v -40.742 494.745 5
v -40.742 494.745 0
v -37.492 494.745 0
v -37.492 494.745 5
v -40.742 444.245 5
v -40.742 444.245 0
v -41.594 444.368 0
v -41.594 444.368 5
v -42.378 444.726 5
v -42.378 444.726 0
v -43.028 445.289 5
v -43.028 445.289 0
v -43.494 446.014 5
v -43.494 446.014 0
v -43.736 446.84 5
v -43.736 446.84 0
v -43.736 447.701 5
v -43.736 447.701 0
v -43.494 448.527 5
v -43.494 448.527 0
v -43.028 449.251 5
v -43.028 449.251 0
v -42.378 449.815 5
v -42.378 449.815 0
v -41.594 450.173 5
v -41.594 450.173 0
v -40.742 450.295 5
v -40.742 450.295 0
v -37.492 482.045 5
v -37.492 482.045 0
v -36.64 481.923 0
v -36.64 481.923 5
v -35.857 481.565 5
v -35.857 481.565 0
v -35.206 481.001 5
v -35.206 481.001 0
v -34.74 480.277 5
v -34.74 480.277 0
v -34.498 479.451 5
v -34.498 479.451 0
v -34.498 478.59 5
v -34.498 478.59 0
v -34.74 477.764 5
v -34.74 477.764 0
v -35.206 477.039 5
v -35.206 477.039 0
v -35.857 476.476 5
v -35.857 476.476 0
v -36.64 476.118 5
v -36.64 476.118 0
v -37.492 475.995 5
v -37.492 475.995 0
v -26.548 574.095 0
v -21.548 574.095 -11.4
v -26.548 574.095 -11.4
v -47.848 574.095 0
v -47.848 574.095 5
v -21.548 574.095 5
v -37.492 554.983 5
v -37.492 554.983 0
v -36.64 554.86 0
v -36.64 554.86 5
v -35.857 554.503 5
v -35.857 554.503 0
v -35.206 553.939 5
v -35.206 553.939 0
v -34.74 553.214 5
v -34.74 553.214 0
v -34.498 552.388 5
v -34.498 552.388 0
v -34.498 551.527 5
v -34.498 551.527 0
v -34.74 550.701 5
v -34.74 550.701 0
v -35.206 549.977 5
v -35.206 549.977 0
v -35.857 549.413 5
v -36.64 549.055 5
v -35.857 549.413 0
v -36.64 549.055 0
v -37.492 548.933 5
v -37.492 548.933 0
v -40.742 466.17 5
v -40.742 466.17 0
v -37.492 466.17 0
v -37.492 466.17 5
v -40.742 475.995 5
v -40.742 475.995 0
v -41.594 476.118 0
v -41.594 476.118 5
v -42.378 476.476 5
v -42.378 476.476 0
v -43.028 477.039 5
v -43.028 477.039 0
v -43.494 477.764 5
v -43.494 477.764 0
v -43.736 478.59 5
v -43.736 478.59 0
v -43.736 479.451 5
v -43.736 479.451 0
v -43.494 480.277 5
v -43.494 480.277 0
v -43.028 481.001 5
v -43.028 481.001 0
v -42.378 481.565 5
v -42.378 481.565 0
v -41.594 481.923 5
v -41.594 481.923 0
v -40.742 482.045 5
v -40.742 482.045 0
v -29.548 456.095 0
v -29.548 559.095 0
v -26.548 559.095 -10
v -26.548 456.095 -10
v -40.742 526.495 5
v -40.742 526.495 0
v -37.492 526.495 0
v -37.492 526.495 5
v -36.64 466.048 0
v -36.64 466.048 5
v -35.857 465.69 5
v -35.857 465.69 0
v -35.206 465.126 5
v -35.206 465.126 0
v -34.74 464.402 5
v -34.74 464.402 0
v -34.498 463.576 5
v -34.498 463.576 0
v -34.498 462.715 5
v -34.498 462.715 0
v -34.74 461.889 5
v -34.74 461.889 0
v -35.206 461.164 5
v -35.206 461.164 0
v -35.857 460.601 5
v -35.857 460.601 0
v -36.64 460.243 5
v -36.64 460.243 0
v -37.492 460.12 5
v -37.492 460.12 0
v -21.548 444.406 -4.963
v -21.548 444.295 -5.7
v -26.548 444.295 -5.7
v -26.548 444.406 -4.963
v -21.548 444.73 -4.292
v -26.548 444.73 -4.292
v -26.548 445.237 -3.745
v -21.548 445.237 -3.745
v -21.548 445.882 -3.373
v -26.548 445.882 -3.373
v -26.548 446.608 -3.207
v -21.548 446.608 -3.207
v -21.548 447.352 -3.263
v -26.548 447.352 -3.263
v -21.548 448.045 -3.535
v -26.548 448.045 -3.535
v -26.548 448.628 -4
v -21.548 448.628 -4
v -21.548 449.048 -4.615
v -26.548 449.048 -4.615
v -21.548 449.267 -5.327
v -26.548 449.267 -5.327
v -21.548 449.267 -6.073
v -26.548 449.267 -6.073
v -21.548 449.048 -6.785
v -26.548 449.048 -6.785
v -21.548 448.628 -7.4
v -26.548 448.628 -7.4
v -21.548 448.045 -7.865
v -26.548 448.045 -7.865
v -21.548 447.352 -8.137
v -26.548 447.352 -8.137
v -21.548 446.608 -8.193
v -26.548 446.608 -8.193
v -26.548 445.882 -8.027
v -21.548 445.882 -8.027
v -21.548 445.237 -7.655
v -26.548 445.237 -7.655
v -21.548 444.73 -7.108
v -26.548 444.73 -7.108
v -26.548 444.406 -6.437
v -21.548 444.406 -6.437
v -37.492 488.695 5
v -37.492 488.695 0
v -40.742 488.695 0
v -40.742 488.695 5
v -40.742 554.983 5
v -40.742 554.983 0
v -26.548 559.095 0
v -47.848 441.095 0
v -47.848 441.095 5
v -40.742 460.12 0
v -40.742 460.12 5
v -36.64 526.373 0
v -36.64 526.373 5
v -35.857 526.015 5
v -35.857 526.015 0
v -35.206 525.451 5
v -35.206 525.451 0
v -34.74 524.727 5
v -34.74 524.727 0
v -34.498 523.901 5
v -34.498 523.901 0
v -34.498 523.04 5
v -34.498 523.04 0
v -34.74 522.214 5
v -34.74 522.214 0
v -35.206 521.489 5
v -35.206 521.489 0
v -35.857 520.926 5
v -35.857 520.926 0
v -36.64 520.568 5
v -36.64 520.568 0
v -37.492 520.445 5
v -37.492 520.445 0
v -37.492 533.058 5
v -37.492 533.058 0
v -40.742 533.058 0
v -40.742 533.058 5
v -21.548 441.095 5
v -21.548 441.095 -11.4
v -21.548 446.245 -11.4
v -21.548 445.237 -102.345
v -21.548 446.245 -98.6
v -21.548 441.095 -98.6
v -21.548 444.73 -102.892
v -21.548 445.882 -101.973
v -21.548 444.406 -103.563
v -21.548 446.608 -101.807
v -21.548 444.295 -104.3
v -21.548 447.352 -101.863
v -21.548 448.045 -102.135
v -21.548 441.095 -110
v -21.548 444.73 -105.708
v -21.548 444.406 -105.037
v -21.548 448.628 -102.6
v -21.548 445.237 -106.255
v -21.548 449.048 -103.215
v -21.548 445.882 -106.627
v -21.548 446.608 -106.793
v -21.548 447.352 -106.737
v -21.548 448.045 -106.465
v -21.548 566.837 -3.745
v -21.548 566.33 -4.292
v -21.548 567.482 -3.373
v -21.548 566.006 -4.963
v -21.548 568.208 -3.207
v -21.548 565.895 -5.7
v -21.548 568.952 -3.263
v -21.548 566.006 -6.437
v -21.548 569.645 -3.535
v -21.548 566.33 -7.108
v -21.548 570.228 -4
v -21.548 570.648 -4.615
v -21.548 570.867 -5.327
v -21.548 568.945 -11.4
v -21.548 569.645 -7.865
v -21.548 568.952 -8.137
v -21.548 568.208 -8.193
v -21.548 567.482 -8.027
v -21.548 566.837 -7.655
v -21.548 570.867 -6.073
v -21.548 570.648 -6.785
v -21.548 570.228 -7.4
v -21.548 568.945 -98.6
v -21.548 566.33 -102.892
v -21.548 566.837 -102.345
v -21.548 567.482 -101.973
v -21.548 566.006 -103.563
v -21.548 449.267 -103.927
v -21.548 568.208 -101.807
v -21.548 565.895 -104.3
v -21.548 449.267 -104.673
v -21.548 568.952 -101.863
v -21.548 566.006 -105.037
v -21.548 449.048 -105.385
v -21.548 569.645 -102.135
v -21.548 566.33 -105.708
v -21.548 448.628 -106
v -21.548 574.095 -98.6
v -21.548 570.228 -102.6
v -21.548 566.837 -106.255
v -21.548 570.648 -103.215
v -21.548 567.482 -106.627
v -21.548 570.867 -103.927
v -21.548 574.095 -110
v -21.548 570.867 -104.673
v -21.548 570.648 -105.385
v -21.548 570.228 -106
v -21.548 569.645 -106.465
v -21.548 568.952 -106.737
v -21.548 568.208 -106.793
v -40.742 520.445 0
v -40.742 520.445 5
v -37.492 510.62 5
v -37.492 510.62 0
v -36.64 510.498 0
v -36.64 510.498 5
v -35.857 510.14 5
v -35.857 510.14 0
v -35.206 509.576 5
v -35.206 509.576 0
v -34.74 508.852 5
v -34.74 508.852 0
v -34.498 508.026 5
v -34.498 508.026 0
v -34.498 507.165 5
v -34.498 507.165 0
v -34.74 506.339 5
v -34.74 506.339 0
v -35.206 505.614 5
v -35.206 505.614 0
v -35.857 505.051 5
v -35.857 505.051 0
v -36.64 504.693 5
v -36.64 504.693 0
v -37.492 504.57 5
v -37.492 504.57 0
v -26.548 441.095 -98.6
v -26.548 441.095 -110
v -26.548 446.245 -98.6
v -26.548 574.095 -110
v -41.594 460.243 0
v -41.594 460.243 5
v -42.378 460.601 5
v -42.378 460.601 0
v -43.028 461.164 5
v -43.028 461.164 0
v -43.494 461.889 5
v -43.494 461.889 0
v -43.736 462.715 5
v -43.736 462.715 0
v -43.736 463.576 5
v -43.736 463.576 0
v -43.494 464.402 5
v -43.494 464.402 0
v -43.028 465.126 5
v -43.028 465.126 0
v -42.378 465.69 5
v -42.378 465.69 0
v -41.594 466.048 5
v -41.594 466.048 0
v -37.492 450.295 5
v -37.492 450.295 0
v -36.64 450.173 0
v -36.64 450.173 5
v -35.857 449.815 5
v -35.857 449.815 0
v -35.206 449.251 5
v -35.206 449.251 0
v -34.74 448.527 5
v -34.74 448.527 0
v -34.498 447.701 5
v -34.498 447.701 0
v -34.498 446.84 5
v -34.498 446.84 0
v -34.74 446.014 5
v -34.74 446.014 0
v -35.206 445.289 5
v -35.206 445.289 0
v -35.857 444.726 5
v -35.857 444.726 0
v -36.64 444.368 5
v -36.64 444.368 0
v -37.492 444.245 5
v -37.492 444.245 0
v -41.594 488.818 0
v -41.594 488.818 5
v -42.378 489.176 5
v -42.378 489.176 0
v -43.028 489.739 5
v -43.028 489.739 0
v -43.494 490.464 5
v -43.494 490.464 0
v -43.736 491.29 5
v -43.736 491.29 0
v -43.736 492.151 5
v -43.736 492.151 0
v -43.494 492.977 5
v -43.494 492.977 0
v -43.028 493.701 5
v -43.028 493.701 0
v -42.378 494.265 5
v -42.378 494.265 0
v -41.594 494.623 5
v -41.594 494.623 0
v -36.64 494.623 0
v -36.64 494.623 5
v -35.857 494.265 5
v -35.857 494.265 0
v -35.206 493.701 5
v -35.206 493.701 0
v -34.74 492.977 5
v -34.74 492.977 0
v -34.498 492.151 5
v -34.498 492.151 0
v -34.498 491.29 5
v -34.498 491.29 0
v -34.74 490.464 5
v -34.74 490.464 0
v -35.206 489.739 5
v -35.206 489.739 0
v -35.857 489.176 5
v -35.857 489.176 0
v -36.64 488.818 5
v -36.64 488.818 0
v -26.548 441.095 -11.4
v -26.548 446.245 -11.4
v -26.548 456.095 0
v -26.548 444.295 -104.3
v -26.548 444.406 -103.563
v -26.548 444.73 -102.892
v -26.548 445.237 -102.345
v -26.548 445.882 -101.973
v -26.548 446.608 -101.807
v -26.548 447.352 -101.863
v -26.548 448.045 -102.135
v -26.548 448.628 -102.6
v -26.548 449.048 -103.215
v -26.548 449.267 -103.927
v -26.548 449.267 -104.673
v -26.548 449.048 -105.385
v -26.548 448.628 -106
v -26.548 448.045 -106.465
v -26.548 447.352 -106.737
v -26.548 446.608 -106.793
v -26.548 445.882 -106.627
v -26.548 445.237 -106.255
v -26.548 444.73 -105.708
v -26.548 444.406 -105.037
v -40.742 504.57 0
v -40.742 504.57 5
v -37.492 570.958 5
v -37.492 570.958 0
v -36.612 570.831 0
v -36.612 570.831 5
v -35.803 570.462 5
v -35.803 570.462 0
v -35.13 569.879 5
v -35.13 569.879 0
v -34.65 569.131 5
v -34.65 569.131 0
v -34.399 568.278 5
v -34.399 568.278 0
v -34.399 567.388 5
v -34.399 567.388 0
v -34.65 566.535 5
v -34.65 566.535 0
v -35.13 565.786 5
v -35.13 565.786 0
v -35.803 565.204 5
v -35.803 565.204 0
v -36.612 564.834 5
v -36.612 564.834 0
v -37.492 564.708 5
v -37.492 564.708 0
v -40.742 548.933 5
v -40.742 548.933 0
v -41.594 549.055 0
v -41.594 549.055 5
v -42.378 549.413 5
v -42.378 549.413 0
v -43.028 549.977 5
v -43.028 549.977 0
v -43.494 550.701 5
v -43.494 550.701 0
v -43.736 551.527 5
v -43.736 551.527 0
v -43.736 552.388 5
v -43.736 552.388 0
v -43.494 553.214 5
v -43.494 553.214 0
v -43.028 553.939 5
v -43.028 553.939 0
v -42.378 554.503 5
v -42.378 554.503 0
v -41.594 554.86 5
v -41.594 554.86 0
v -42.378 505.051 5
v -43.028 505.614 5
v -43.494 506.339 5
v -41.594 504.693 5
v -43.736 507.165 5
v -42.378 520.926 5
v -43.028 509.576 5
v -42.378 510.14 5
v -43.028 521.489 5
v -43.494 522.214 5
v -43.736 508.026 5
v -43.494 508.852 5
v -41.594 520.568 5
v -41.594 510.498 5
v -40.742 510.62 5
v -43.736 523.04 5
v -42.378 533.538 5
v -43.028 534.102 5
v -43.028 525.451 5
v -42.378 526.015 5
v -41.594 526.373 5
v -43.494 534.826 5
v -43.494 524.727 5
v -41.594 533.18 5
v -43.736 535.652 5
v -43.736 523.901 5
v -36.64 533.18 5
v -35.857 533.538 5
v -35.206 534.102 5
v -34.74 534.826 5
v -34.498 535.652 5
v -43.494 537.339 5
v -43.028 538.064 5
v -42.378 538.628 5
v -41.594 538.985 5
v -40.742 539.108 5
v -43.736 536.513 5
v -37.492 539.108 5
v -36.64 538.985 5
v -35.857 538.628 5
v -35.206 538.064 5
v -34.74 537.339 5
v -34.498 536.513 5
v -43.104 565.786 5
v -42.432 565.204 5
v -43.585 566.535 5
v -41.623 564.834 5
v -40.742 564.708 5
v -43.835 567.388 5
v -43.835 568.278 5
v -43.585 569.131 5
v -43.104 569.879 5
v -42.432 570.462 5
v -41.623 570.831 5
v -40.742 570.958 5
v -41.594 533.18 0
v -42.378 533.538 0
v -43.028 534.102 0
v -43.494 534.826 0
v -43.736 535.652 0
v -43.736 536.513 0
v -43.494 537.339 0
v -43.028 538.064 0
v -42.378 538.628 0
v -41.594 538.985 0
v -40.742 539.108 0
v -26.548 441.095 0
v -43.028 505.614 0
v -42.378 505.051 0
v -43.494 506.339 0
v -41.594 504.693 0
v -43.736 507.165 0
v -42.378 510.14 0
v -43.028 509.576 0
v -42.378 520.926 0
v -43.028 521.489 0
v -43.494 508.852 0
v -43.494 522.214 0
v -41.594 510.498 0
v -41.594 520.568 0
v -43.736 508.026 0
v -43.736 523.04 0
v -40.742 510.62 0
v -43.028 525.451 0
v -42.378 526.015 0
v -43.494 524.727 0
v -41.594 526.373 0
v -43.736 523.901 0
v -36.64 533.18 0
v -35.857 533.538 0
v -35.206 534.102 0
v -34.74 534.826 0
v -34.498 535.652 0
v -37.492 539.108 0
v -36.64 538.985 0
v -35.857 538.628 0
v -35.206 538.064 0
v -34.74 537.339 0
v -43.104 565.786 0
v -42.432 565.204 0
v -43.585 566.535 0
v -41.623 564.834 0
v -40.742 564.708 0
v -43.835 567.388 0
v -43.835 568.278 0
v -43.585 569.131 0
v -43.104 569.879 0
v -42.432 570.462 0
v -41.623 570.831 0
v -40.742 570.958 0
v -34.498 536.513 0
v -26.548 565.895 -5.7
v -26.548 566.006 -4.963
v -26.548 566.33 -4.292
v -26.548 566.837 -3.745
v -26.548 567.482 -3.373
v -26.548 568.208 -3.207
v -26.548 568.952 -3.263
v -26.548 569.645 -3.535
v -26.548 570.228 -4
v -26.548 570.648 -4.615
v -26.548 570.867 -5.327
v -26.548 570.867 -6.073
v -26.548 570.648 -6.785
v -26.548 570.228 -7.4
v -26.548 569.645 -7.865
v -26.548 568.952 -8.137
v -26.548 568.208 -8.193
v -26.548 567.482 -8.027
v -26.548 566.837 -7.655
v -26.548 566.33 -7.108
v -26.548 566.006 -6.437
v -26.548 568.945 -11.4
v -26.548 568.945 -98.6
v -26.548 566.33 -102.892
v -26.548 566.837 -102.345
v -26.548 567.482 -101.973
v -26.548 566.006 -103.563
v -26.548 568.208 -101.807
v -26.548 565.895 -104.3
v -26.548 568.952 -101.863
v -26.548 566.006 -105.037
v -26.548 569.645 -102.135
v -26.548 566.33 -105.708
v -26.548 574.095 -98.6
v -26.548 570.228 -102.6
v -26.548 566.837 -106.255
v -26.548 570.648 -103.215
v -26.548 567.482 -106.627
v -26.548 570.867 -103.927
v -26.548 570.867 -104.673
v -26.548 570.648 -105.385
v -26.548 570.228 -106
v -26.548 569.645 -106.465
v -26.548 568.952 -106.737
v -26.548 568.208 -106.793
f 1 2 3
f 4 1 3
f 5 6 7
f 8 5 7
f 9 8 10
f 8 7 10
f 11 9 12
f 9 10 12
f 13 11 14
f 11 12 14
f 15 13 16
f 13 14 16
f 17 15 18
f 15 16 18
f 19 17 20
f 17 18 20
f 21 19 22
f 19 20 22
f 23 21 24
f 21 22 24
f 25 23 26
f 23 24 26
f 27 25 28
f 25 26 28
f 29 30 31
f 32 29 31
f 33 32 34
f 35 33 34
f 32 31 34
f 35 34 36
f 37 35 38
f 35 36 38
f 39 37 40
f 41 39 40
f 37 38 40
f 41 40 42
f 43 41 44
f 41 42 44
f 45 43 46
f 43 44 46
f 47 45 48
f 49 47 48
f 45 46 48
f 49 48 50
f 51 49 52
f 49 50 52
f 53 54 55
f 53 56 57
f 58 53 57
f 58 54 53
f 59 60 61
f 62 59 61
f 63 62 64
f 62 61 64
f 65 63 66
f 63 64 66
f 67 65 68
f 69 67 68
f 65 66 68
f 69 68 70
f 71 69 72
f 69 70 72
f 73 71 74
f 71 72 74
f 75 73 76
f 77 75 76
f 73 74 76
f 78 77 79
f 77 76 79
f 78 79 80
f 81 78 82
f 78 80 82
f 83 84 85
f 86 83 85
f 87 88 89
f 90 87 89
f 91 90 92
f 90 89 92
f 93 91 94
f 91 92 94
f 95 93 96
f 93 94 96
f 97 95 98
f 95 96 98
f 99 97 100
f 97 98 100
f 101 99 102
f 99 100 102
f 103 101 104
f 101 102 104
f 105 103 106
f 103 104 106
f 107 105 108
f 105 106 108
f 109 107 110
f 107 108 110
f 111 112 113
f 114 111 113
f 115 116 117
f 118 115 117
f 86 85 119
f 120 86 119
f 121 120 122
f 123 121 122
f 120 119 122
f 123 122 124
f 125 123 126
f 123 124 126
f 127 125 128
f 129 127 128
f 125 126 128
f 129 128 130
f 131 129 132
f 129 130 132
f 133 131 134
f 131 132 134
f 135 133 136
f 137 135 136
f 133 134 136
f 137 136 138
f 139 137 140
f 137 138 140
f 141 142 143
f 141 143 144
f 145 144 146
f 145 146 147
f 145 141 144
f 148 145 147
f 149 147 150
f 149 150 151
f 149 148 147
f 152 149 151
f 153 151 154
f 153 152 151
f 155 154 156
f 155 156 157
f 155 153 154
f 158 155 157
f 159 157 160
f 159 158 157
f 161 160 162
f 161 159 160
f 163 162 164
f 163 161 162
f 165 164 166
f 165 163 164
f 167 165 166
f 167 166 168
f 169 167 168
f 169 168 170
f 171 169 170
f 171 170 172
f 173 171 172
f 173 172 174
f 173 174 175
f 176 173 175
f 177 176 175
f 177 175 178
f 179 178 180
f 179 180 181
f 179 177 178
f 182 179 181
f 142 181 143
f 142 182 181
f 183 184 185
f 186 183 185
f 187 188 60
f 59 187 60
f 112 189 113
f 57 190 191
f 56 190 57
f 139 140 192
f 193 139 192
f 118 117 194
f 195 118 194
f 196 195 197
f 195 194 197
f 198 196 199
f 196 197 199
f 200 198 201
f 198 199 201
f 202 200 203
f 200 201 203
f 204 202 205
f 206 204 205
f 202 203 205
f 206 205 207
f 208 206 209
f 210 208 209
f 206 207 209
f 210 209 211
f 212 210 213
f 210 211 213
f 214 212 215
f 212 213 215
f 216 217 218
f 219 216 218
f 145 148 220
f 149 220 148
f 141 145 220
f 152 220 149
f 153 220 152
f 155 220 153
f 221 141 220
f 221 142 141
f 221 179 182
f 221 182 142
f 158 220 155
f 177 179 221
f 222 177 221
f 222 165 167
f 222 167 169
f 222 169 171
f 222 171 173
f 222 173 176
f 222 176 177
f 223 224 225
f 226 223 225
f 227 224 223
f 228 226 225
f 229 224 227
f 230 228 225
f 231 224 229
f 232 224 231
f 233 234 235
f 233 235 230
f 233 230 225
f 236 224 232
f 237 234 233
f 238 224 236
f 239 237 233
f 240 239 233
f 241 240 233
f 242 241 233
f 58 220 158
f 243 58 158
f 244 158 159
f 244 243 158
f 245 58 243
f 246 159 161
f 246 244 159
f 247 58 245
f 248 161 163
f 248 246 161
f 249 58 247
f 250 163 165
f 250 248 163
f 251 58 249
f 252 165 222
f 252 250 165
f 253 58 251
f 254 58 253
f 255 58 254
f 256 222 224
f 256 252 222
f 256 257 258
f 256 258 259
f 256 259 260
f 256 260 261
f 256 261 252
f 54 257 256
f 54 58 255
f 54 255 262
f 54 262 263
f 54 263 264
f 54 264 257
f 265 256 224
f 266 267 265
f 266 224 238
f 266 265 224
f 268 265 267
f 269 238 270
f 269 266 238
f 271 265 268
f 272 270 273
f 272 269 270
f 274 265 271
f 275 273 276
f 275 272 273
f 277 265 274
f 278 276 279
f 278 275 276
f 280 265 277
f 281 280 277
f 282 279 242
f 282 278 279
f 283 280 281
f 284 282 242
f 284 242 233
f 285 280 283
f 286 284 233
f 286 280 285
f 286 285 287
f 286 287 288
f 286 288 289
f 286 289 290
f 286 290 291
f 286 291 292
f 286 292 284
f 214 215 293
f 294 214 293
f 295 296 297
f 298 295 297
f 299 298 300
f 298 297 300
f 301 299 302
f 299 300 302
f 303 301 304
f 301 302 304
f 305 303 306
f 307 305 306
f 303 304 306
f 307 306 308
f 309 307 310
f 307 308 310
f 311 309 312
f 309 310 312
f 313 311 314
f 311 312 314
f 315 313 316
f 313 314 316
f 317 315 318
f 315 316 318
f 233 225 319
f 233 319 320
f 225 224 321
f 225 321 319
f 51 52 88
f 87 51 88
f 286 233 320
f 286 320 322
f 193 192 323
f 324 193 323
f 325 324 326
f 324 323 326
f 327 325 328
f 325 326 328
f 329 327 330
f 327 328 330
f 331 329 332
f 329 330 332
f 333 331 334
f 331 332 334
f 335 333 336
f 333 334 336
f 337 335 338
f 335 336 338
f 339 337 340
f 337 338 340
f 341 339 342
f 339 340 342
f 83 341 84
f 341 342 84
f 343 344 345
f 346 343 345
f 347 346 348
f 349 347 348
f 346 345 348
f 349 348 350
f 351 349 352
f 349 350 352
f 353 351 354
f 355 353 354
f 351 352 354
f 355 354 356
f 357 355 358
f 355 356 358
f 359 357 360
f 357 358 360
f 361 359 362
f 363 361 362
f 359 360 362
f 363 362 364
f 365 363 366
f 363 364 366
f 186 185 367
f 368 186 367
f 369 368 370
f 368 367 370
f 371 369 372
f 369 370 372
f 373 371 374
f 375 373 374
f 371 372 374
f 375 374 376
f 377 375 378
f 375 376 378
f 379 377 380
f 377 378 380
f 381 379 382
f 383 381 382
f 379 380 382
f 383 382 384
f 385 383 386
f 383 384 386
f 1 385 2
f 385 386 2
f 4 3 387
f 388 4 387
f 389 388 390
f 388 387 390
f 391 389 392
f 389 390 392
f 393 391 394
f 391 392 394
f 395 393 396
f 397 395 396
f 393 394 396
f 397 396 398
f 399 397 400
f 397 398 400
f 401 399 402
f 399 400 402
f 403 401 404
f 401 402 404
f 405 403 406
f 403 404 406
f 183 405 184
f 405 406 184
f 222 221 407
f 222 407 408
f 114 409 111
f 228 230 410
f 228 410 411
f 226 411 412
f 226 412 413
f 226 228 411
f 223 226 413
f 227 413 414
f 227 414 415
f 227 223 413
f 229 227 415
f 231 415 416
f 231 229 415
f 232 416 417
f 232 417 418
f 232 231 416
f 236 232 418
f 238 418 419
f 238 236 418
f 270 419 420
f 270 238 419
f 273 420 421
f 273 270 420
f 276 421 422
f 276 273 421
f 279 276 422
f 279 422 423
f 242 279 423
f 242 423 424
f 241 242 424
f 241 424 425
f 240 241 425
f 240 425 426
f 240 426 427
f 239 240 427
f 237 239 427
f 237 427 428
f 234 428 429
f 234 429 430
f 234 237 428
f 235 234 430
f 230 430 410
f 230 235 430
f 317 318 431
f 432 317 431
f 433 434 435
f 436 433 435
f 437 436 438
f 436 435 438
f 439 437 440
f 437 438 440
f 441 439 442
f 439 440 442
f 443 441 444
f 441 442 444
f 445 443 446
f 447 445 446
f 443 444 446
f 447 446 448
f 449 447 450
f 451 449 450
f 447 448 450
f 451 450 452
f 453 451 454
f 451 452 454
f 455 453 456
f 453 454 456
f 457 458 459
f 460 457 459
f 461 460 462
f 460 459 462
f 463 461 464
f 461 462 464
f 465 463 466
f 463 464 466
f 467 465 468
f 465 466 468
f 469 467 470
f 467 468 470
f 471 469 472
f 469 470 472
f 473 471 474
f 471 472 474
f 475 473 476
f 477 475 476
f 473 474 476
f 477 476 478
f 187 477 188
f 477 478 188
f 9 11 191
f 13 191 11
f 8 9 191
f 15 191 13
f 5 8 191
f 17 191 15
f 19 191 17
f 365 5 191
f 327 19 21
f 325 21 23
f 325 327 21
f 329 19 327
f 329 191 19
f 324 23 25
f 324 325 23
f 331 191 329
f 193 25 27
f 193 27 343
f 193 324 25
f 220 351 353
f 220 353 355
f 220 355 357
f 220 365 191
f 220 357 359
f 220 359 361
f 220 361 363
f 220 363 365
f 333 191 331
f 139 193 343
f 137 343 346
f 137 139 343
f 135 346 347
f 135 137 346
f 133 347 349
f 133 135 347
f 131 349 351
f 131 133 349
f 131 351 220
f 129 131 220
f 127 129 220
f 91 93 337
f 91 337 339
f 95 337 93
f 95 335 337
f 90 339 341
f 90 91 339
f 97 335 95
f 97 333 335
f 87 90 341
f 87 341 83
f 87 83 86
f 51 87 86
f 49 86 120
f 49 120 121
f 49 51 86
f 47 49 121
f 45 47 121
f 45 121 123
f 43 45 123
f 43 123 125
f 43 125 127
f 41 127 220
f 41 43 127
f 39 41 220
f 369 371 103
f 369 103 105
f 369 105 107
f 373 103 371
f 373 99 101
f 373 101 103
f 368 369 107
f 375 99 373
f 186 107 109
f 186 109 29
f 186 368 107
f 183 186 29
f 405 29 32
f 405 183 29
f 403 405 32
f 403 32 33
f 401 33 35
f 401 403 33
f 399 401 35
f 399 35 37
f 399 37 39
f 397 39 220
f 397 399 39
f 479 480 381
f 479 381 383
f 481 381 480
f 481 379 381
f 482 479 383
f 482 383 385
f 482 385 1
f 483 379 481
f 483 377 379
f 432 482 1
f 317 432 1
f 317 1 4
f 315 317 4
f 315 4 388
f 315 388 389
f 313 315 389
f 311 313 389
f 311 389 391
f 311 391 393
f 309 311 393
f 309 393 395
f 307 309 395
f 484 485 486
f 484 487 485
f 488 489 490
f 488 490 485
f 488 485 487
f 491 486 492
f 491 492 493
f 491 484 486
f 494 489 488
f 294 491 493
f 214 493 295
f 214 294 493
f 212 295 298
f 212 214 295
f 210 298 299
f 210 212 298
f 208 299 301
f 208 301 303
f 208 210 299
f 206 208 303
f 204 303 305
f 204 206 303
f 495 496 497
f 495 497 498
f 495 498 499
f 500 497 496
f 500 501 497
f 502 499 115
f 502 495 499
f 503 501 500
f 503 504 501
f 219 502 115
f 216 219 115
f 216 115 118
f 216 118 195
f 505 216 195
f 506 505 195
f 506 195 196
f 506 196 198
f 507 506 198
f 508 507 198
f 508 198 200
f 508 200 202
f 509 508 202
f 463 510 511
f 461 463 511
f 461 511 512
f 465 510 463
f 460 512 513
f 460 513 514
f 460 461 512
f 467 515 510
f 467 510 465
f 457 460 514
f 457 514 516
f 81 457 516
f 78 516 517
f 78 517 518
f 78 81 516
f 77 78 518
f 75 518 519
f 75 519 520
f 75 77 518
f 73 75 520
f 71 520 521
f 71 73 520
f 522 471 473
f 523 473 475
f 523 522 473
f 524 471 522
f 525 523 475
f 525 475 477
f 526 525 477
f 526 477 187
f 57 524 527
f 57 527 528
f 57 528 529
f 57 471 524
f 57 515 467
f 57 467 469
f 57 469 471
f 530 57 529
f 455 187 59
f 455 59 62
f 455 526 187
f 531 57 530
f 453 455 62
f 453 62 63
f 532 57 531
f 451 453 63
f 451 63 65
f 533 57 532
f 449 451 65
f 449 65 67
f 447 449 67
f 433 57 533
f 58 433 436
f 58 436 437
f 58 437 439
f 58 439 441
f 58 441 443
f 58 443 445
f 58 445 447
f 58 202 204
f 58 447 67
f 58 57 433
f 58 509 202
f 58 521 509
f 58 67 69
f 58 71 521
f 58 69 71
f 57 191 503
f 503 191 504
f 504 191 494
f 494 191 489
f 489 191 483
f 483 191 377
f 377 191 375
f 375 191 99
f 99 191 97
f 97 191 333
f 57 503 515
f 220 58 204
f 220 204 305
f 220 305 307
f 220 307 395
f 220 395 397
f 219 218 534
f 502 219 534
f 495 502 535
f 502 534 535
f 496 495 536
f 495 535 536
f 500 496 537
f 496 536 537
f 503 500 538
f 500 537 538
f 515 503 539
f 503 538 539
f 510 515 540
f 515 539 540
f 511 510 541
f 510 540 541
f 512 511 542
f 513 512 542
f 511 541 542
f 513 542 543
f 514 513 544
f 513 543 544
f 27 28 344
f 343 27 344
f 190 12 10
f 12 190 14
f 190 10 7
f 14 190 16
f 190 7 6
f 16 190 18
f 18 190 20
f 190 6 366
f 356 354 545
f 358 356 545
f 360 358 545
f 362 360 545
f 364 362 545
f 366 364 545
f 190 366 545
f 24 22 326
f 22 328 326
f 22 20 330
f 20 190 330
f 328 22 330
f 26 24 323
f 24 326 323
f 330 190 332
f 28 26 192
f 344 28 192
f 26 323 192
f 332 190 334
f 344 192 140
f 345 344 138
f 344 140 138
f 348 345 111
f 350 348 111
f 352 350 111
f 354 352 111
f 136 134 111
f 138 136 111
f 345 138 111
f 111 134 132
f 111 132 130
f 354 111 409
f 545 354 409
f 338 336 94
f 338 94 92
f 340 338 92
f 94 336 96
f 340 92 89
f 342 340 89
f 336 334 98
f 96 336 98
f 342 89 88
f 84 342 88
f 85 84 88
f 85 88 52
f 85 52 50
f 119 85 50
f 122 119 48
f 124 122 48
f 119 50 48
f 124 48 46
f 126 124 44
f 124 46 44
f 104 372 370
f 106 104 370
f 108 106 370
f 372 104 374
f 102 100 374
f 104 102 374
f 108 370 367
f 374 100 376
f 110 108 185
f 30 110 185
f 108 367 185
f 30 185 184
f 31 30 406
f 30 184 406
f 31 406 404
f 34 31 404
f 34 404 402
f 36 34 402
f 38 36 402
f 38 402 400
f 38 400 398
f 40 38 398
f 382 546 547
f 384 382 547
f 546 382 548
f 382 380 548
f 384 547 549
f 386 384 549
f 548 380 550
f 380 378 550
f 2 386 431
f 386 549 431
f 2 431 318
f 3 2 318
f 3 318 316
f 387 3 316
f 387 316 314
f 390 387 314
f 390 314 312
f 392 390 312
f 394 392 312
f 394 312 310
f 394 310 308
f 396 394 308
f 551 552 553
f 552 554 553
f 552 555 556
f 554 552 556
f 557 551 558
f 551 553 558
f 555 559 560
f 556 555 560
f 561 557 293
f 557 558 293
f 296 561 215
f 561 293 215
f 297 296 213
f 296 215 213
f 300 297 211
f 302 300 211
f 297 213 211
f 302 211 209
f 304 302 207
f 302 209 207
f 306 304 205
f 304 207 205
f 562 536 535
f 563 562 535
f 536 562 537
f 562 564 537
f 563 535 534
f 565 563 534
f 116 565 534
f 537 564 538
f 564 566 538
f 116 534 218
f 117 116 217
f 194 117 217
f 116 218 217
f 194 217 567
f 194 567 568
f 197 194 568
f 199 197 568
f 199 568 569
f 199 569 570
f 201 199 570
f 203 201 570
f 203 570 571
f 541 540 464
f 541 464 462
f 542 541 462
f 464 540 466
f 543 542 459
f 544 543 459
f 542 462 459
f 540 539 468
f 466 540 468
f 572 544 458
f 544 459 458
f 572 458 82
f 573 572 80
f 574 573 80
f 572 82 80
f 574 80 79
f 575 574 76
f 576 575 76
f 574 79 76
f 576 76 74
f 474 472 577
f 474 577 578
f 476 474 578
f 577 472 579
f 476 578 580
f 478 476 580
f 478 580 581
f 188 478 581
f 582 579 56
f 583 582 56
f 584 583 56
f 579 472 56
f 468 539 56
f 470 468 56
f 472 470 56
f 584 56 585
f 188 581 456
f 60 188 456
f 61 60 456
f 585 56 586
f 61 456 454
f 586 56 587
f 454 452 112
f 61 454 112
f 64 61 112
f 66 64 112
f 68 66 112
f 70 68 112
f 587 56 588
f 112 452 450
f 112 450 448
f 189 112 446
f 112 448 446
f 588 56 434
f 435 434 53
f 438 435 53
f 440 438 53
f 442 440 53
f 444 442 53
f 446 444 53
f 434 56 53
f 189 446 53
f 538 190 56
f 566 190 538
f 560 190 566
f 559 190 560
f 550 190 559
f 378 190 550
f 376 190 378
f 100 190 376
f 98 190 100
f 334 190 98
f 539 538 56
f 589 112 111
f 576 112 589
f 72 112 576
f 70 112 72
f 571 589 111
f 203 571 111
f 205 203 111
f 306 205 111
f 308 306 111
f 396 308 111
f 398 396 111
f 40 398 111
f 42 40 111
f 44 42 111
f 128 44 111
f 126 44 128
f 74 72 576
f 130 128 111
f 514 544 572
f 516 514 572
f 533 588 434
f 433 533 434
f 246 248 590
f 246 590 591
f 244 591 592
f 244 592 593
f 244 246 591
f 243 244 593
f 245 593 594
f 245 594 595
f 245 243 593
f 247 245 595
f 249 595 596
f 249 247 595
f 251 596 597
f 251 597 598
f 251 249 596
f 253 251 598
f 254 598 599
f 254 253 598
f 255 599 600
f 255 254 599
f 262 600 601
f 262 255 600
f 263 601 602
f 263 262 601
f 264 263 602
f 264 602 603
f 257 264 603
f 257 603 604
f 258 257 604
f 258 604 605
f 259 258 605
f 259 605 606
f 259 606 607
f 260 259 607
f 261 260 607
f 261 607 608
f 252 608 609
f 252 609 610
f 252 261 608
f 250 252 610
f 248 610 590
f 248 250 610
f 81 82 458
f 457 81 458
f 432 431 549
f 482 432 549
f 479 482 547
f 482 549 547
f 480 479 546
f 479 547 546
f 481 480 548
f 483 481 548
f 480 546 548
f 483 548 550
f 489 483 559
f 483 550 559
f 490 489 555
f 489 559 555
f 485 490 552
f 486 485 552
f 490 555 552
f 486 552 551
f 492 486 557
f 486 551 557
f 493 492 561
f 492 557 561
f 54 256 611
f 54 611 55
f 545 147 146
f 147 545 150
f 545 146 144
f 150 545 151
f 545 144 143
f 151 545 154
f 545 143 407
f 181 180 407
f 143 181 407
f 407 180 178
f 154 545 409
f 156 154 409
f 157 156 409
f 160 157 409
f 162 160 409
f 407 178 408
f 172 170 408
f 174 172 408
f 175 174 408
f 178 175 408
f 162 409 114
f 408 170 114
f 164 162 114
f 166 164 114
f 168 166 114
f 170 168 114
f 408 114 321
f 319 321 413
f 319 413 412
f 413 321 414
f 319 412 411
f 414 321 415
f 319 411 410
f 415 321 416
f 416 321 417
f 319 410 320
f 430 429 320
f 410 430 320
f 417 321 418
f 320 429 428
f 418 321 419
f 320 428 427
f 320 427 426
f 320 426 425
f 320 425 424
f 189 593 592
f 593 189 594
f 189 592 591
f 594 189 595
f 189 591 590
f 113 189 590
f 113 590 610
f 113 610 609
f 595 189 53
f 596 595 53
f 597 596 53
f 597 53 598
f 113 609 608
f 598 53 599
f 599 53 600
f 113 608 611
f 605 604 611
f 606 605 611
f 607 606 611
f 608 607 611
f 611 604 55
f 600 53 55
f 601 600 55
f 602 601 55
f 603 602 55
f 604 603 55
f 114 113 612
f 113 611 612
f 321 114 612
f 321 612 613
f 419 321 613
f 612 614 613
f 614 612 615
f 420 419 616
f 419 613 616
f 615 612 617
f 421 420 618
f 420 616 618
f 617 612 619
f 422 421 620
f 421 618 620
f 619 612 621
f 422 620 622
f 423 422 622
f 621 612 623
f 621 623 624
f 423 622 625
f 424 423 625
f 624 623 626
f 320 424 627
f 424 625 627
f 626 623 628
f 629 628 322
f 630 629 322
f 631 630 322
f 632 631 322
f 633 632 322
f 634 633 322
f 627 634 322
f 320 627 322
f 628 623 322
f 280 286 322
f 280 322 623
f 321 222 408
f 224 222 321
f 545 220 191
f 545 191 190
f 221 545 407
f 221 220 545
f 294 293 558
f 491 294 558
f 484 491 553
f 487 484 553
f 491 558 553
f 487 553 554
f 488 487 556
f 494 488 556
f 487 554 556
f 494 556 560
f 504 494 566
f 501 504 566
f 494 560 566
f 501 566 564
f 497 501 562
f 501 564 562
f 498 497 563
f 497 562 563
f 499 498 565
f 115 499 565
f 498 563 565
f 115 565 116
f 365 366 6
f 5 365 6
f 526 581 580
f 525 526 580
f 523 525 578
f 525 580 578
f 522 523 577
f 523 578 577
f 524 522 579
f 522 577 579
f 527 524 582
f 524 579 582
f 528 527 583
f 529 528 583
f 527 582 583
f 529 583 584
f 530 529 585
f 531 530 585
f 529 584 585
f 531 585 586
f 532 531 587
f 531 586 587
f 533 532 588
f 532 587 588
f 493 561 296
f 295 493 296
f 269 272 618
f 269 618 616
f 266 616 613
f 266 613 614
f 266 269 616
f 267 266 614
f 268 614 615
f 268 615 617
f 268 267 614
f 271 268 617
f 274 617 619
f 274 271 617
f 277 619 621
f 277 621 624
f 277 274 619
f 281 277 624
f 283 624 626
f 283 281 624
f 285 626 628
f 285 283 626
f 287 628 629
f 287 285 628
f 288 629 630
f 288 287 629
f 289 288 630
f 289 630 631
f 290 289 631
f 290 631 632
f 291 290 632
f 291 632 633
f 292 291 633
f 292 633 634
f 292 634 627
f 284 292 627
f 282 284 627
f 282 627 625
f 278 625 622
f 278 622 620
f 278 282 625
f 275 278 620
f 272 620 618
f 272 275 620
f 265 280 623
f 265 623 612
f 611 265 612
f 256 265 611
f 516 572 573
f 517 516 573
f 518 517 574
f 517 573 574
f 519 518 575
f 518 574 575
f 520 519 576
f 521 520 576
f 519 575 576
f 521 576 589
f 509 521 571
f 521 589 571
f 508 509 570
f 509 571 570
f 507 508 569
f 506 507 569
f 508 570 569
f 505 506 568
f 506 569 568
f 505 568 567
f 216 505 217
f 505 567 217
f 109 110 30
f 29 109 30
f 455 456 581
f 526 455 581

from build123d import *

# Parameters (mm, degrees)
SKETCH1_W           = 26.3
SKETCH1_H           = 133
BOSS_EXTRUDE1_DEPTH = 5
SKETCH2_R           = 2.5
BOSS_EXTRUDE2_DEPTH = 5
BOSS_EXTRUDE3_START = -15
BOSS_EXTRUDE3_DEPTH = 103


with BuildPart() as part:
    # Sketch1 → Boss-Extrude1 (new body)
    with BuildSketch(Plane.XY):
        with Locations((-34.698380987, 507.595307356)):
            Rectangle(SKETCH1_W, SKETCH1_H)
        with BuildLine():
            ThreePointArc((-40.742130987, 444.245307356), (-43.767130987, 447.270307356), (-40.742130987, 450.295307356))
            Line((-40.742130987, 450.295307356), (-37.492130987, 450.295307356))
            ThreePointArc((-37.492130987, 450.295307356), (-34.467130987, 447.270307356), (-37.492130987, 444.245307356))
            Line((-37.492130987, 444.245307356), (-40.742130987, 444.245307356))
        make_face(mode=Mode.SUBTRACT)
        with BuildLine():
            ThreePointArc((-40.742130987, 460.120307356), (-43.767130987, 463.145307356), (-40.742130987, 466.170307356))
            Line((-40.742130987, 466.170307356), (-37.492130987, 466.170307356))
            ThreePointArc((-37.492130987, 466.170307356), (-34.467130987, 463.145307356), (-37.492130987, 460.120307356))
            Line((-37.492130987, 460.120307356), (-40.742130987, 460.120307356))
        make_face(mode=Mode.SUBTRACT)
        with BuildLine():
            ThreePointArc((-40.742130987, 475.995307356), (-43.767130987, 479.020307356), (-40.742130987, 482.045307356))
            Line((-40.742130987, 482.045307356), (-37.492130987, 482.045307356))
            ThreePointArc((-37.492130987, 482.045307356), (-34.467130987, 479.020307356), (-37.492130987, 475.995307356))
            Line((-37.492130987, 475.995307356), (-40.742130987, 475.995307356))
        make_face(mode=Mode.SUBTRACT)
        with BuildLine():
            ThreePointArc((-40.742130987, 488.695307356), (-43.767130987, 491.720307356), (-40.742130987, 494.745307356))
            Line((-40.742130987, 494.745307356), (-37.492130987, 494.745307356))
            ThreePointArc((-37.492130987, 494.745307356), (-34.467130987, 491.720307356), (-37.492130987, 488.695307356))
            Line((-37.492130987, 488.695307356), (-40.742130987, 488.695307356))
        make_face(mode=Mode.SUBTRACT)
        with BuildLine():
            ThreePointArc((-40.742130987, 504.570307356), (-43.767130987, 507.595307356), (-40.742130987, 510.620307356))
            Line((-40.742130987, 510.620307356), (-37.492130987, 510.620307356))
            ThreePointArc((-37.492130987, 510.620307356), (-34.467130987, 507.595307356), (-37.492130987, 504.570307356))
            Line((-37.492130987, 504.570307356), (-40.742130987, 504.570307356))
        make_face(mode=Mode.SUBTRACT)
        with BuildLine():
            ThreePointArc((-40.742130987, 520.445307356), (-43.767130987, 523.470307356), (-40.742130987, 526.495307356))
            Line((-40.742130987, 526.495307356), (-37.492130987, 526.495307356))
            ThreePointArc((-37.492130987, 526.495307356), (-34.467130987, 523.470307356), (-37.492130987, 520.445307356))
            Line((-37.492130987, 520.445307356), (-40.742130987, 520.445307356))
        make_face(mode=Mode.SUBTRACT)
        with BuildLine():
            ThreePointArc((-40.742130987, 533.057807356), (-43.767130987, 536.082807356), (-40.742130987, 539.107807356))
            Line((-40.742130987, 539.107807356), (-37.492130987, 539.107807356))
            ThreePointArc((-37.492130987, 539.107807356), (-34.467130987, 536.082807356), (-37.492130987, 533.057807356))
            Line((-37.492130987, 533.057807356), (-40.742130987, 533.057807356))
        make_face(mode=Mode.SUBTRACT)
        with BuildLine():
            ThreePointArc((-40.742130987, 548.932807356), (-43.767130987, 551.957807356), (-40.742130987, 554.982807356))
            Line((-40.742130987, 554.982807356), (-37.492130987, 554.982807356))
            ThreePointArc((-37.492130987, 554.982807356), (-34.467130987, 551.957807356), (-37.492130987, 548.932807356))
            Line((-37.492130987, 548.932807356), (-40.742130987, 548.932807356))
        make_face(mode=Mode.SUBTRACT)
        with BuildLine():
            ThreePointArc((-40.742130987, 564.707807356), (-43.867130987, 567.832807356), (-40.742130987, 570.957807356))
            Line((-40.742130987, 570.957807356), (-37.492130987, 570.957807356))
            ThreePointArc((-37.492130987, 570.957807356), (-34.367130987, 567.832807356), (-37.492130987, 564.707807356))
            Line((-37.492130987, 564.707807356), (-40.742130987, 564.707807356))
        make_face(mode=Mode.SUBTRACT)
    extrude(amount=BOSS_EXTRUDE1_DEPTH)



with BuildPart() as body_2:
    # Sketch2 → Boss-Extrude2 (new body)
    with BuildSketch(Plane.ZY.offset(21.548380987)):
        Polygon((0, 558.595307356), (0, 456.595307356), (0, 441.095307356), (-11.4, 441.095307356), (-11.4, 446.245307356), (-98.6, 446.245307356), (-98.6, 441.095307356), (-110, 441.095307356), (-110, 574.095307356), (-98.6, 574.095307356), (-98.6, 568.945307356), (-11.4, 568.945307356), (-11.4, 574.095307356), (0, 574.095307356), align=None)
        with Locations(Location((-5.7, 568.395307356, 0), (0, 0, 270))):
            Circle(SKETCH2_R, mode=Mode.SUBTRACT)
        with Locations(Location((-104.3, 568.395307356, 0), (0, 0, 270))):
            Circle(SKETCH2_R, mode=Mode.SUBTRACT)
        with Locations(Location((-104.3, 446.795307356, 0), (0, 0, 270))):
            Circle(SKETCH2_R, mode=Mode.SUBTRACT)
        with Locations(Location((-5.7, 446.795307356, 0), (0, 0, 270))):
            Circle(SKETCH2_R, mode=Mode.SUBTRACT)
    extrude(amount=BOSS_EXTRUDE2_DEPTH)


with BuildPart() as part_1:
    add(part.part)

    add(body_2.part)  # Boss-Extrude3 merges body 2
    # Sketch4 → Boss-Extrude3 (add)
    with BuildSketch(Plane(origin=(0, 574.095307356, 0), x_dir=(1, 0, 0), z_dir=(0, 1, 0)).offset(BOSS_EXTRUDE3_START)):
        Polygon((-26.548380987, 0), (-29.548380987, 0), (-26.548380987, 10), align=None)
    extrude(amount=-BOSS_EXTRUDE3_DEPTH)


solid = part_1.part
